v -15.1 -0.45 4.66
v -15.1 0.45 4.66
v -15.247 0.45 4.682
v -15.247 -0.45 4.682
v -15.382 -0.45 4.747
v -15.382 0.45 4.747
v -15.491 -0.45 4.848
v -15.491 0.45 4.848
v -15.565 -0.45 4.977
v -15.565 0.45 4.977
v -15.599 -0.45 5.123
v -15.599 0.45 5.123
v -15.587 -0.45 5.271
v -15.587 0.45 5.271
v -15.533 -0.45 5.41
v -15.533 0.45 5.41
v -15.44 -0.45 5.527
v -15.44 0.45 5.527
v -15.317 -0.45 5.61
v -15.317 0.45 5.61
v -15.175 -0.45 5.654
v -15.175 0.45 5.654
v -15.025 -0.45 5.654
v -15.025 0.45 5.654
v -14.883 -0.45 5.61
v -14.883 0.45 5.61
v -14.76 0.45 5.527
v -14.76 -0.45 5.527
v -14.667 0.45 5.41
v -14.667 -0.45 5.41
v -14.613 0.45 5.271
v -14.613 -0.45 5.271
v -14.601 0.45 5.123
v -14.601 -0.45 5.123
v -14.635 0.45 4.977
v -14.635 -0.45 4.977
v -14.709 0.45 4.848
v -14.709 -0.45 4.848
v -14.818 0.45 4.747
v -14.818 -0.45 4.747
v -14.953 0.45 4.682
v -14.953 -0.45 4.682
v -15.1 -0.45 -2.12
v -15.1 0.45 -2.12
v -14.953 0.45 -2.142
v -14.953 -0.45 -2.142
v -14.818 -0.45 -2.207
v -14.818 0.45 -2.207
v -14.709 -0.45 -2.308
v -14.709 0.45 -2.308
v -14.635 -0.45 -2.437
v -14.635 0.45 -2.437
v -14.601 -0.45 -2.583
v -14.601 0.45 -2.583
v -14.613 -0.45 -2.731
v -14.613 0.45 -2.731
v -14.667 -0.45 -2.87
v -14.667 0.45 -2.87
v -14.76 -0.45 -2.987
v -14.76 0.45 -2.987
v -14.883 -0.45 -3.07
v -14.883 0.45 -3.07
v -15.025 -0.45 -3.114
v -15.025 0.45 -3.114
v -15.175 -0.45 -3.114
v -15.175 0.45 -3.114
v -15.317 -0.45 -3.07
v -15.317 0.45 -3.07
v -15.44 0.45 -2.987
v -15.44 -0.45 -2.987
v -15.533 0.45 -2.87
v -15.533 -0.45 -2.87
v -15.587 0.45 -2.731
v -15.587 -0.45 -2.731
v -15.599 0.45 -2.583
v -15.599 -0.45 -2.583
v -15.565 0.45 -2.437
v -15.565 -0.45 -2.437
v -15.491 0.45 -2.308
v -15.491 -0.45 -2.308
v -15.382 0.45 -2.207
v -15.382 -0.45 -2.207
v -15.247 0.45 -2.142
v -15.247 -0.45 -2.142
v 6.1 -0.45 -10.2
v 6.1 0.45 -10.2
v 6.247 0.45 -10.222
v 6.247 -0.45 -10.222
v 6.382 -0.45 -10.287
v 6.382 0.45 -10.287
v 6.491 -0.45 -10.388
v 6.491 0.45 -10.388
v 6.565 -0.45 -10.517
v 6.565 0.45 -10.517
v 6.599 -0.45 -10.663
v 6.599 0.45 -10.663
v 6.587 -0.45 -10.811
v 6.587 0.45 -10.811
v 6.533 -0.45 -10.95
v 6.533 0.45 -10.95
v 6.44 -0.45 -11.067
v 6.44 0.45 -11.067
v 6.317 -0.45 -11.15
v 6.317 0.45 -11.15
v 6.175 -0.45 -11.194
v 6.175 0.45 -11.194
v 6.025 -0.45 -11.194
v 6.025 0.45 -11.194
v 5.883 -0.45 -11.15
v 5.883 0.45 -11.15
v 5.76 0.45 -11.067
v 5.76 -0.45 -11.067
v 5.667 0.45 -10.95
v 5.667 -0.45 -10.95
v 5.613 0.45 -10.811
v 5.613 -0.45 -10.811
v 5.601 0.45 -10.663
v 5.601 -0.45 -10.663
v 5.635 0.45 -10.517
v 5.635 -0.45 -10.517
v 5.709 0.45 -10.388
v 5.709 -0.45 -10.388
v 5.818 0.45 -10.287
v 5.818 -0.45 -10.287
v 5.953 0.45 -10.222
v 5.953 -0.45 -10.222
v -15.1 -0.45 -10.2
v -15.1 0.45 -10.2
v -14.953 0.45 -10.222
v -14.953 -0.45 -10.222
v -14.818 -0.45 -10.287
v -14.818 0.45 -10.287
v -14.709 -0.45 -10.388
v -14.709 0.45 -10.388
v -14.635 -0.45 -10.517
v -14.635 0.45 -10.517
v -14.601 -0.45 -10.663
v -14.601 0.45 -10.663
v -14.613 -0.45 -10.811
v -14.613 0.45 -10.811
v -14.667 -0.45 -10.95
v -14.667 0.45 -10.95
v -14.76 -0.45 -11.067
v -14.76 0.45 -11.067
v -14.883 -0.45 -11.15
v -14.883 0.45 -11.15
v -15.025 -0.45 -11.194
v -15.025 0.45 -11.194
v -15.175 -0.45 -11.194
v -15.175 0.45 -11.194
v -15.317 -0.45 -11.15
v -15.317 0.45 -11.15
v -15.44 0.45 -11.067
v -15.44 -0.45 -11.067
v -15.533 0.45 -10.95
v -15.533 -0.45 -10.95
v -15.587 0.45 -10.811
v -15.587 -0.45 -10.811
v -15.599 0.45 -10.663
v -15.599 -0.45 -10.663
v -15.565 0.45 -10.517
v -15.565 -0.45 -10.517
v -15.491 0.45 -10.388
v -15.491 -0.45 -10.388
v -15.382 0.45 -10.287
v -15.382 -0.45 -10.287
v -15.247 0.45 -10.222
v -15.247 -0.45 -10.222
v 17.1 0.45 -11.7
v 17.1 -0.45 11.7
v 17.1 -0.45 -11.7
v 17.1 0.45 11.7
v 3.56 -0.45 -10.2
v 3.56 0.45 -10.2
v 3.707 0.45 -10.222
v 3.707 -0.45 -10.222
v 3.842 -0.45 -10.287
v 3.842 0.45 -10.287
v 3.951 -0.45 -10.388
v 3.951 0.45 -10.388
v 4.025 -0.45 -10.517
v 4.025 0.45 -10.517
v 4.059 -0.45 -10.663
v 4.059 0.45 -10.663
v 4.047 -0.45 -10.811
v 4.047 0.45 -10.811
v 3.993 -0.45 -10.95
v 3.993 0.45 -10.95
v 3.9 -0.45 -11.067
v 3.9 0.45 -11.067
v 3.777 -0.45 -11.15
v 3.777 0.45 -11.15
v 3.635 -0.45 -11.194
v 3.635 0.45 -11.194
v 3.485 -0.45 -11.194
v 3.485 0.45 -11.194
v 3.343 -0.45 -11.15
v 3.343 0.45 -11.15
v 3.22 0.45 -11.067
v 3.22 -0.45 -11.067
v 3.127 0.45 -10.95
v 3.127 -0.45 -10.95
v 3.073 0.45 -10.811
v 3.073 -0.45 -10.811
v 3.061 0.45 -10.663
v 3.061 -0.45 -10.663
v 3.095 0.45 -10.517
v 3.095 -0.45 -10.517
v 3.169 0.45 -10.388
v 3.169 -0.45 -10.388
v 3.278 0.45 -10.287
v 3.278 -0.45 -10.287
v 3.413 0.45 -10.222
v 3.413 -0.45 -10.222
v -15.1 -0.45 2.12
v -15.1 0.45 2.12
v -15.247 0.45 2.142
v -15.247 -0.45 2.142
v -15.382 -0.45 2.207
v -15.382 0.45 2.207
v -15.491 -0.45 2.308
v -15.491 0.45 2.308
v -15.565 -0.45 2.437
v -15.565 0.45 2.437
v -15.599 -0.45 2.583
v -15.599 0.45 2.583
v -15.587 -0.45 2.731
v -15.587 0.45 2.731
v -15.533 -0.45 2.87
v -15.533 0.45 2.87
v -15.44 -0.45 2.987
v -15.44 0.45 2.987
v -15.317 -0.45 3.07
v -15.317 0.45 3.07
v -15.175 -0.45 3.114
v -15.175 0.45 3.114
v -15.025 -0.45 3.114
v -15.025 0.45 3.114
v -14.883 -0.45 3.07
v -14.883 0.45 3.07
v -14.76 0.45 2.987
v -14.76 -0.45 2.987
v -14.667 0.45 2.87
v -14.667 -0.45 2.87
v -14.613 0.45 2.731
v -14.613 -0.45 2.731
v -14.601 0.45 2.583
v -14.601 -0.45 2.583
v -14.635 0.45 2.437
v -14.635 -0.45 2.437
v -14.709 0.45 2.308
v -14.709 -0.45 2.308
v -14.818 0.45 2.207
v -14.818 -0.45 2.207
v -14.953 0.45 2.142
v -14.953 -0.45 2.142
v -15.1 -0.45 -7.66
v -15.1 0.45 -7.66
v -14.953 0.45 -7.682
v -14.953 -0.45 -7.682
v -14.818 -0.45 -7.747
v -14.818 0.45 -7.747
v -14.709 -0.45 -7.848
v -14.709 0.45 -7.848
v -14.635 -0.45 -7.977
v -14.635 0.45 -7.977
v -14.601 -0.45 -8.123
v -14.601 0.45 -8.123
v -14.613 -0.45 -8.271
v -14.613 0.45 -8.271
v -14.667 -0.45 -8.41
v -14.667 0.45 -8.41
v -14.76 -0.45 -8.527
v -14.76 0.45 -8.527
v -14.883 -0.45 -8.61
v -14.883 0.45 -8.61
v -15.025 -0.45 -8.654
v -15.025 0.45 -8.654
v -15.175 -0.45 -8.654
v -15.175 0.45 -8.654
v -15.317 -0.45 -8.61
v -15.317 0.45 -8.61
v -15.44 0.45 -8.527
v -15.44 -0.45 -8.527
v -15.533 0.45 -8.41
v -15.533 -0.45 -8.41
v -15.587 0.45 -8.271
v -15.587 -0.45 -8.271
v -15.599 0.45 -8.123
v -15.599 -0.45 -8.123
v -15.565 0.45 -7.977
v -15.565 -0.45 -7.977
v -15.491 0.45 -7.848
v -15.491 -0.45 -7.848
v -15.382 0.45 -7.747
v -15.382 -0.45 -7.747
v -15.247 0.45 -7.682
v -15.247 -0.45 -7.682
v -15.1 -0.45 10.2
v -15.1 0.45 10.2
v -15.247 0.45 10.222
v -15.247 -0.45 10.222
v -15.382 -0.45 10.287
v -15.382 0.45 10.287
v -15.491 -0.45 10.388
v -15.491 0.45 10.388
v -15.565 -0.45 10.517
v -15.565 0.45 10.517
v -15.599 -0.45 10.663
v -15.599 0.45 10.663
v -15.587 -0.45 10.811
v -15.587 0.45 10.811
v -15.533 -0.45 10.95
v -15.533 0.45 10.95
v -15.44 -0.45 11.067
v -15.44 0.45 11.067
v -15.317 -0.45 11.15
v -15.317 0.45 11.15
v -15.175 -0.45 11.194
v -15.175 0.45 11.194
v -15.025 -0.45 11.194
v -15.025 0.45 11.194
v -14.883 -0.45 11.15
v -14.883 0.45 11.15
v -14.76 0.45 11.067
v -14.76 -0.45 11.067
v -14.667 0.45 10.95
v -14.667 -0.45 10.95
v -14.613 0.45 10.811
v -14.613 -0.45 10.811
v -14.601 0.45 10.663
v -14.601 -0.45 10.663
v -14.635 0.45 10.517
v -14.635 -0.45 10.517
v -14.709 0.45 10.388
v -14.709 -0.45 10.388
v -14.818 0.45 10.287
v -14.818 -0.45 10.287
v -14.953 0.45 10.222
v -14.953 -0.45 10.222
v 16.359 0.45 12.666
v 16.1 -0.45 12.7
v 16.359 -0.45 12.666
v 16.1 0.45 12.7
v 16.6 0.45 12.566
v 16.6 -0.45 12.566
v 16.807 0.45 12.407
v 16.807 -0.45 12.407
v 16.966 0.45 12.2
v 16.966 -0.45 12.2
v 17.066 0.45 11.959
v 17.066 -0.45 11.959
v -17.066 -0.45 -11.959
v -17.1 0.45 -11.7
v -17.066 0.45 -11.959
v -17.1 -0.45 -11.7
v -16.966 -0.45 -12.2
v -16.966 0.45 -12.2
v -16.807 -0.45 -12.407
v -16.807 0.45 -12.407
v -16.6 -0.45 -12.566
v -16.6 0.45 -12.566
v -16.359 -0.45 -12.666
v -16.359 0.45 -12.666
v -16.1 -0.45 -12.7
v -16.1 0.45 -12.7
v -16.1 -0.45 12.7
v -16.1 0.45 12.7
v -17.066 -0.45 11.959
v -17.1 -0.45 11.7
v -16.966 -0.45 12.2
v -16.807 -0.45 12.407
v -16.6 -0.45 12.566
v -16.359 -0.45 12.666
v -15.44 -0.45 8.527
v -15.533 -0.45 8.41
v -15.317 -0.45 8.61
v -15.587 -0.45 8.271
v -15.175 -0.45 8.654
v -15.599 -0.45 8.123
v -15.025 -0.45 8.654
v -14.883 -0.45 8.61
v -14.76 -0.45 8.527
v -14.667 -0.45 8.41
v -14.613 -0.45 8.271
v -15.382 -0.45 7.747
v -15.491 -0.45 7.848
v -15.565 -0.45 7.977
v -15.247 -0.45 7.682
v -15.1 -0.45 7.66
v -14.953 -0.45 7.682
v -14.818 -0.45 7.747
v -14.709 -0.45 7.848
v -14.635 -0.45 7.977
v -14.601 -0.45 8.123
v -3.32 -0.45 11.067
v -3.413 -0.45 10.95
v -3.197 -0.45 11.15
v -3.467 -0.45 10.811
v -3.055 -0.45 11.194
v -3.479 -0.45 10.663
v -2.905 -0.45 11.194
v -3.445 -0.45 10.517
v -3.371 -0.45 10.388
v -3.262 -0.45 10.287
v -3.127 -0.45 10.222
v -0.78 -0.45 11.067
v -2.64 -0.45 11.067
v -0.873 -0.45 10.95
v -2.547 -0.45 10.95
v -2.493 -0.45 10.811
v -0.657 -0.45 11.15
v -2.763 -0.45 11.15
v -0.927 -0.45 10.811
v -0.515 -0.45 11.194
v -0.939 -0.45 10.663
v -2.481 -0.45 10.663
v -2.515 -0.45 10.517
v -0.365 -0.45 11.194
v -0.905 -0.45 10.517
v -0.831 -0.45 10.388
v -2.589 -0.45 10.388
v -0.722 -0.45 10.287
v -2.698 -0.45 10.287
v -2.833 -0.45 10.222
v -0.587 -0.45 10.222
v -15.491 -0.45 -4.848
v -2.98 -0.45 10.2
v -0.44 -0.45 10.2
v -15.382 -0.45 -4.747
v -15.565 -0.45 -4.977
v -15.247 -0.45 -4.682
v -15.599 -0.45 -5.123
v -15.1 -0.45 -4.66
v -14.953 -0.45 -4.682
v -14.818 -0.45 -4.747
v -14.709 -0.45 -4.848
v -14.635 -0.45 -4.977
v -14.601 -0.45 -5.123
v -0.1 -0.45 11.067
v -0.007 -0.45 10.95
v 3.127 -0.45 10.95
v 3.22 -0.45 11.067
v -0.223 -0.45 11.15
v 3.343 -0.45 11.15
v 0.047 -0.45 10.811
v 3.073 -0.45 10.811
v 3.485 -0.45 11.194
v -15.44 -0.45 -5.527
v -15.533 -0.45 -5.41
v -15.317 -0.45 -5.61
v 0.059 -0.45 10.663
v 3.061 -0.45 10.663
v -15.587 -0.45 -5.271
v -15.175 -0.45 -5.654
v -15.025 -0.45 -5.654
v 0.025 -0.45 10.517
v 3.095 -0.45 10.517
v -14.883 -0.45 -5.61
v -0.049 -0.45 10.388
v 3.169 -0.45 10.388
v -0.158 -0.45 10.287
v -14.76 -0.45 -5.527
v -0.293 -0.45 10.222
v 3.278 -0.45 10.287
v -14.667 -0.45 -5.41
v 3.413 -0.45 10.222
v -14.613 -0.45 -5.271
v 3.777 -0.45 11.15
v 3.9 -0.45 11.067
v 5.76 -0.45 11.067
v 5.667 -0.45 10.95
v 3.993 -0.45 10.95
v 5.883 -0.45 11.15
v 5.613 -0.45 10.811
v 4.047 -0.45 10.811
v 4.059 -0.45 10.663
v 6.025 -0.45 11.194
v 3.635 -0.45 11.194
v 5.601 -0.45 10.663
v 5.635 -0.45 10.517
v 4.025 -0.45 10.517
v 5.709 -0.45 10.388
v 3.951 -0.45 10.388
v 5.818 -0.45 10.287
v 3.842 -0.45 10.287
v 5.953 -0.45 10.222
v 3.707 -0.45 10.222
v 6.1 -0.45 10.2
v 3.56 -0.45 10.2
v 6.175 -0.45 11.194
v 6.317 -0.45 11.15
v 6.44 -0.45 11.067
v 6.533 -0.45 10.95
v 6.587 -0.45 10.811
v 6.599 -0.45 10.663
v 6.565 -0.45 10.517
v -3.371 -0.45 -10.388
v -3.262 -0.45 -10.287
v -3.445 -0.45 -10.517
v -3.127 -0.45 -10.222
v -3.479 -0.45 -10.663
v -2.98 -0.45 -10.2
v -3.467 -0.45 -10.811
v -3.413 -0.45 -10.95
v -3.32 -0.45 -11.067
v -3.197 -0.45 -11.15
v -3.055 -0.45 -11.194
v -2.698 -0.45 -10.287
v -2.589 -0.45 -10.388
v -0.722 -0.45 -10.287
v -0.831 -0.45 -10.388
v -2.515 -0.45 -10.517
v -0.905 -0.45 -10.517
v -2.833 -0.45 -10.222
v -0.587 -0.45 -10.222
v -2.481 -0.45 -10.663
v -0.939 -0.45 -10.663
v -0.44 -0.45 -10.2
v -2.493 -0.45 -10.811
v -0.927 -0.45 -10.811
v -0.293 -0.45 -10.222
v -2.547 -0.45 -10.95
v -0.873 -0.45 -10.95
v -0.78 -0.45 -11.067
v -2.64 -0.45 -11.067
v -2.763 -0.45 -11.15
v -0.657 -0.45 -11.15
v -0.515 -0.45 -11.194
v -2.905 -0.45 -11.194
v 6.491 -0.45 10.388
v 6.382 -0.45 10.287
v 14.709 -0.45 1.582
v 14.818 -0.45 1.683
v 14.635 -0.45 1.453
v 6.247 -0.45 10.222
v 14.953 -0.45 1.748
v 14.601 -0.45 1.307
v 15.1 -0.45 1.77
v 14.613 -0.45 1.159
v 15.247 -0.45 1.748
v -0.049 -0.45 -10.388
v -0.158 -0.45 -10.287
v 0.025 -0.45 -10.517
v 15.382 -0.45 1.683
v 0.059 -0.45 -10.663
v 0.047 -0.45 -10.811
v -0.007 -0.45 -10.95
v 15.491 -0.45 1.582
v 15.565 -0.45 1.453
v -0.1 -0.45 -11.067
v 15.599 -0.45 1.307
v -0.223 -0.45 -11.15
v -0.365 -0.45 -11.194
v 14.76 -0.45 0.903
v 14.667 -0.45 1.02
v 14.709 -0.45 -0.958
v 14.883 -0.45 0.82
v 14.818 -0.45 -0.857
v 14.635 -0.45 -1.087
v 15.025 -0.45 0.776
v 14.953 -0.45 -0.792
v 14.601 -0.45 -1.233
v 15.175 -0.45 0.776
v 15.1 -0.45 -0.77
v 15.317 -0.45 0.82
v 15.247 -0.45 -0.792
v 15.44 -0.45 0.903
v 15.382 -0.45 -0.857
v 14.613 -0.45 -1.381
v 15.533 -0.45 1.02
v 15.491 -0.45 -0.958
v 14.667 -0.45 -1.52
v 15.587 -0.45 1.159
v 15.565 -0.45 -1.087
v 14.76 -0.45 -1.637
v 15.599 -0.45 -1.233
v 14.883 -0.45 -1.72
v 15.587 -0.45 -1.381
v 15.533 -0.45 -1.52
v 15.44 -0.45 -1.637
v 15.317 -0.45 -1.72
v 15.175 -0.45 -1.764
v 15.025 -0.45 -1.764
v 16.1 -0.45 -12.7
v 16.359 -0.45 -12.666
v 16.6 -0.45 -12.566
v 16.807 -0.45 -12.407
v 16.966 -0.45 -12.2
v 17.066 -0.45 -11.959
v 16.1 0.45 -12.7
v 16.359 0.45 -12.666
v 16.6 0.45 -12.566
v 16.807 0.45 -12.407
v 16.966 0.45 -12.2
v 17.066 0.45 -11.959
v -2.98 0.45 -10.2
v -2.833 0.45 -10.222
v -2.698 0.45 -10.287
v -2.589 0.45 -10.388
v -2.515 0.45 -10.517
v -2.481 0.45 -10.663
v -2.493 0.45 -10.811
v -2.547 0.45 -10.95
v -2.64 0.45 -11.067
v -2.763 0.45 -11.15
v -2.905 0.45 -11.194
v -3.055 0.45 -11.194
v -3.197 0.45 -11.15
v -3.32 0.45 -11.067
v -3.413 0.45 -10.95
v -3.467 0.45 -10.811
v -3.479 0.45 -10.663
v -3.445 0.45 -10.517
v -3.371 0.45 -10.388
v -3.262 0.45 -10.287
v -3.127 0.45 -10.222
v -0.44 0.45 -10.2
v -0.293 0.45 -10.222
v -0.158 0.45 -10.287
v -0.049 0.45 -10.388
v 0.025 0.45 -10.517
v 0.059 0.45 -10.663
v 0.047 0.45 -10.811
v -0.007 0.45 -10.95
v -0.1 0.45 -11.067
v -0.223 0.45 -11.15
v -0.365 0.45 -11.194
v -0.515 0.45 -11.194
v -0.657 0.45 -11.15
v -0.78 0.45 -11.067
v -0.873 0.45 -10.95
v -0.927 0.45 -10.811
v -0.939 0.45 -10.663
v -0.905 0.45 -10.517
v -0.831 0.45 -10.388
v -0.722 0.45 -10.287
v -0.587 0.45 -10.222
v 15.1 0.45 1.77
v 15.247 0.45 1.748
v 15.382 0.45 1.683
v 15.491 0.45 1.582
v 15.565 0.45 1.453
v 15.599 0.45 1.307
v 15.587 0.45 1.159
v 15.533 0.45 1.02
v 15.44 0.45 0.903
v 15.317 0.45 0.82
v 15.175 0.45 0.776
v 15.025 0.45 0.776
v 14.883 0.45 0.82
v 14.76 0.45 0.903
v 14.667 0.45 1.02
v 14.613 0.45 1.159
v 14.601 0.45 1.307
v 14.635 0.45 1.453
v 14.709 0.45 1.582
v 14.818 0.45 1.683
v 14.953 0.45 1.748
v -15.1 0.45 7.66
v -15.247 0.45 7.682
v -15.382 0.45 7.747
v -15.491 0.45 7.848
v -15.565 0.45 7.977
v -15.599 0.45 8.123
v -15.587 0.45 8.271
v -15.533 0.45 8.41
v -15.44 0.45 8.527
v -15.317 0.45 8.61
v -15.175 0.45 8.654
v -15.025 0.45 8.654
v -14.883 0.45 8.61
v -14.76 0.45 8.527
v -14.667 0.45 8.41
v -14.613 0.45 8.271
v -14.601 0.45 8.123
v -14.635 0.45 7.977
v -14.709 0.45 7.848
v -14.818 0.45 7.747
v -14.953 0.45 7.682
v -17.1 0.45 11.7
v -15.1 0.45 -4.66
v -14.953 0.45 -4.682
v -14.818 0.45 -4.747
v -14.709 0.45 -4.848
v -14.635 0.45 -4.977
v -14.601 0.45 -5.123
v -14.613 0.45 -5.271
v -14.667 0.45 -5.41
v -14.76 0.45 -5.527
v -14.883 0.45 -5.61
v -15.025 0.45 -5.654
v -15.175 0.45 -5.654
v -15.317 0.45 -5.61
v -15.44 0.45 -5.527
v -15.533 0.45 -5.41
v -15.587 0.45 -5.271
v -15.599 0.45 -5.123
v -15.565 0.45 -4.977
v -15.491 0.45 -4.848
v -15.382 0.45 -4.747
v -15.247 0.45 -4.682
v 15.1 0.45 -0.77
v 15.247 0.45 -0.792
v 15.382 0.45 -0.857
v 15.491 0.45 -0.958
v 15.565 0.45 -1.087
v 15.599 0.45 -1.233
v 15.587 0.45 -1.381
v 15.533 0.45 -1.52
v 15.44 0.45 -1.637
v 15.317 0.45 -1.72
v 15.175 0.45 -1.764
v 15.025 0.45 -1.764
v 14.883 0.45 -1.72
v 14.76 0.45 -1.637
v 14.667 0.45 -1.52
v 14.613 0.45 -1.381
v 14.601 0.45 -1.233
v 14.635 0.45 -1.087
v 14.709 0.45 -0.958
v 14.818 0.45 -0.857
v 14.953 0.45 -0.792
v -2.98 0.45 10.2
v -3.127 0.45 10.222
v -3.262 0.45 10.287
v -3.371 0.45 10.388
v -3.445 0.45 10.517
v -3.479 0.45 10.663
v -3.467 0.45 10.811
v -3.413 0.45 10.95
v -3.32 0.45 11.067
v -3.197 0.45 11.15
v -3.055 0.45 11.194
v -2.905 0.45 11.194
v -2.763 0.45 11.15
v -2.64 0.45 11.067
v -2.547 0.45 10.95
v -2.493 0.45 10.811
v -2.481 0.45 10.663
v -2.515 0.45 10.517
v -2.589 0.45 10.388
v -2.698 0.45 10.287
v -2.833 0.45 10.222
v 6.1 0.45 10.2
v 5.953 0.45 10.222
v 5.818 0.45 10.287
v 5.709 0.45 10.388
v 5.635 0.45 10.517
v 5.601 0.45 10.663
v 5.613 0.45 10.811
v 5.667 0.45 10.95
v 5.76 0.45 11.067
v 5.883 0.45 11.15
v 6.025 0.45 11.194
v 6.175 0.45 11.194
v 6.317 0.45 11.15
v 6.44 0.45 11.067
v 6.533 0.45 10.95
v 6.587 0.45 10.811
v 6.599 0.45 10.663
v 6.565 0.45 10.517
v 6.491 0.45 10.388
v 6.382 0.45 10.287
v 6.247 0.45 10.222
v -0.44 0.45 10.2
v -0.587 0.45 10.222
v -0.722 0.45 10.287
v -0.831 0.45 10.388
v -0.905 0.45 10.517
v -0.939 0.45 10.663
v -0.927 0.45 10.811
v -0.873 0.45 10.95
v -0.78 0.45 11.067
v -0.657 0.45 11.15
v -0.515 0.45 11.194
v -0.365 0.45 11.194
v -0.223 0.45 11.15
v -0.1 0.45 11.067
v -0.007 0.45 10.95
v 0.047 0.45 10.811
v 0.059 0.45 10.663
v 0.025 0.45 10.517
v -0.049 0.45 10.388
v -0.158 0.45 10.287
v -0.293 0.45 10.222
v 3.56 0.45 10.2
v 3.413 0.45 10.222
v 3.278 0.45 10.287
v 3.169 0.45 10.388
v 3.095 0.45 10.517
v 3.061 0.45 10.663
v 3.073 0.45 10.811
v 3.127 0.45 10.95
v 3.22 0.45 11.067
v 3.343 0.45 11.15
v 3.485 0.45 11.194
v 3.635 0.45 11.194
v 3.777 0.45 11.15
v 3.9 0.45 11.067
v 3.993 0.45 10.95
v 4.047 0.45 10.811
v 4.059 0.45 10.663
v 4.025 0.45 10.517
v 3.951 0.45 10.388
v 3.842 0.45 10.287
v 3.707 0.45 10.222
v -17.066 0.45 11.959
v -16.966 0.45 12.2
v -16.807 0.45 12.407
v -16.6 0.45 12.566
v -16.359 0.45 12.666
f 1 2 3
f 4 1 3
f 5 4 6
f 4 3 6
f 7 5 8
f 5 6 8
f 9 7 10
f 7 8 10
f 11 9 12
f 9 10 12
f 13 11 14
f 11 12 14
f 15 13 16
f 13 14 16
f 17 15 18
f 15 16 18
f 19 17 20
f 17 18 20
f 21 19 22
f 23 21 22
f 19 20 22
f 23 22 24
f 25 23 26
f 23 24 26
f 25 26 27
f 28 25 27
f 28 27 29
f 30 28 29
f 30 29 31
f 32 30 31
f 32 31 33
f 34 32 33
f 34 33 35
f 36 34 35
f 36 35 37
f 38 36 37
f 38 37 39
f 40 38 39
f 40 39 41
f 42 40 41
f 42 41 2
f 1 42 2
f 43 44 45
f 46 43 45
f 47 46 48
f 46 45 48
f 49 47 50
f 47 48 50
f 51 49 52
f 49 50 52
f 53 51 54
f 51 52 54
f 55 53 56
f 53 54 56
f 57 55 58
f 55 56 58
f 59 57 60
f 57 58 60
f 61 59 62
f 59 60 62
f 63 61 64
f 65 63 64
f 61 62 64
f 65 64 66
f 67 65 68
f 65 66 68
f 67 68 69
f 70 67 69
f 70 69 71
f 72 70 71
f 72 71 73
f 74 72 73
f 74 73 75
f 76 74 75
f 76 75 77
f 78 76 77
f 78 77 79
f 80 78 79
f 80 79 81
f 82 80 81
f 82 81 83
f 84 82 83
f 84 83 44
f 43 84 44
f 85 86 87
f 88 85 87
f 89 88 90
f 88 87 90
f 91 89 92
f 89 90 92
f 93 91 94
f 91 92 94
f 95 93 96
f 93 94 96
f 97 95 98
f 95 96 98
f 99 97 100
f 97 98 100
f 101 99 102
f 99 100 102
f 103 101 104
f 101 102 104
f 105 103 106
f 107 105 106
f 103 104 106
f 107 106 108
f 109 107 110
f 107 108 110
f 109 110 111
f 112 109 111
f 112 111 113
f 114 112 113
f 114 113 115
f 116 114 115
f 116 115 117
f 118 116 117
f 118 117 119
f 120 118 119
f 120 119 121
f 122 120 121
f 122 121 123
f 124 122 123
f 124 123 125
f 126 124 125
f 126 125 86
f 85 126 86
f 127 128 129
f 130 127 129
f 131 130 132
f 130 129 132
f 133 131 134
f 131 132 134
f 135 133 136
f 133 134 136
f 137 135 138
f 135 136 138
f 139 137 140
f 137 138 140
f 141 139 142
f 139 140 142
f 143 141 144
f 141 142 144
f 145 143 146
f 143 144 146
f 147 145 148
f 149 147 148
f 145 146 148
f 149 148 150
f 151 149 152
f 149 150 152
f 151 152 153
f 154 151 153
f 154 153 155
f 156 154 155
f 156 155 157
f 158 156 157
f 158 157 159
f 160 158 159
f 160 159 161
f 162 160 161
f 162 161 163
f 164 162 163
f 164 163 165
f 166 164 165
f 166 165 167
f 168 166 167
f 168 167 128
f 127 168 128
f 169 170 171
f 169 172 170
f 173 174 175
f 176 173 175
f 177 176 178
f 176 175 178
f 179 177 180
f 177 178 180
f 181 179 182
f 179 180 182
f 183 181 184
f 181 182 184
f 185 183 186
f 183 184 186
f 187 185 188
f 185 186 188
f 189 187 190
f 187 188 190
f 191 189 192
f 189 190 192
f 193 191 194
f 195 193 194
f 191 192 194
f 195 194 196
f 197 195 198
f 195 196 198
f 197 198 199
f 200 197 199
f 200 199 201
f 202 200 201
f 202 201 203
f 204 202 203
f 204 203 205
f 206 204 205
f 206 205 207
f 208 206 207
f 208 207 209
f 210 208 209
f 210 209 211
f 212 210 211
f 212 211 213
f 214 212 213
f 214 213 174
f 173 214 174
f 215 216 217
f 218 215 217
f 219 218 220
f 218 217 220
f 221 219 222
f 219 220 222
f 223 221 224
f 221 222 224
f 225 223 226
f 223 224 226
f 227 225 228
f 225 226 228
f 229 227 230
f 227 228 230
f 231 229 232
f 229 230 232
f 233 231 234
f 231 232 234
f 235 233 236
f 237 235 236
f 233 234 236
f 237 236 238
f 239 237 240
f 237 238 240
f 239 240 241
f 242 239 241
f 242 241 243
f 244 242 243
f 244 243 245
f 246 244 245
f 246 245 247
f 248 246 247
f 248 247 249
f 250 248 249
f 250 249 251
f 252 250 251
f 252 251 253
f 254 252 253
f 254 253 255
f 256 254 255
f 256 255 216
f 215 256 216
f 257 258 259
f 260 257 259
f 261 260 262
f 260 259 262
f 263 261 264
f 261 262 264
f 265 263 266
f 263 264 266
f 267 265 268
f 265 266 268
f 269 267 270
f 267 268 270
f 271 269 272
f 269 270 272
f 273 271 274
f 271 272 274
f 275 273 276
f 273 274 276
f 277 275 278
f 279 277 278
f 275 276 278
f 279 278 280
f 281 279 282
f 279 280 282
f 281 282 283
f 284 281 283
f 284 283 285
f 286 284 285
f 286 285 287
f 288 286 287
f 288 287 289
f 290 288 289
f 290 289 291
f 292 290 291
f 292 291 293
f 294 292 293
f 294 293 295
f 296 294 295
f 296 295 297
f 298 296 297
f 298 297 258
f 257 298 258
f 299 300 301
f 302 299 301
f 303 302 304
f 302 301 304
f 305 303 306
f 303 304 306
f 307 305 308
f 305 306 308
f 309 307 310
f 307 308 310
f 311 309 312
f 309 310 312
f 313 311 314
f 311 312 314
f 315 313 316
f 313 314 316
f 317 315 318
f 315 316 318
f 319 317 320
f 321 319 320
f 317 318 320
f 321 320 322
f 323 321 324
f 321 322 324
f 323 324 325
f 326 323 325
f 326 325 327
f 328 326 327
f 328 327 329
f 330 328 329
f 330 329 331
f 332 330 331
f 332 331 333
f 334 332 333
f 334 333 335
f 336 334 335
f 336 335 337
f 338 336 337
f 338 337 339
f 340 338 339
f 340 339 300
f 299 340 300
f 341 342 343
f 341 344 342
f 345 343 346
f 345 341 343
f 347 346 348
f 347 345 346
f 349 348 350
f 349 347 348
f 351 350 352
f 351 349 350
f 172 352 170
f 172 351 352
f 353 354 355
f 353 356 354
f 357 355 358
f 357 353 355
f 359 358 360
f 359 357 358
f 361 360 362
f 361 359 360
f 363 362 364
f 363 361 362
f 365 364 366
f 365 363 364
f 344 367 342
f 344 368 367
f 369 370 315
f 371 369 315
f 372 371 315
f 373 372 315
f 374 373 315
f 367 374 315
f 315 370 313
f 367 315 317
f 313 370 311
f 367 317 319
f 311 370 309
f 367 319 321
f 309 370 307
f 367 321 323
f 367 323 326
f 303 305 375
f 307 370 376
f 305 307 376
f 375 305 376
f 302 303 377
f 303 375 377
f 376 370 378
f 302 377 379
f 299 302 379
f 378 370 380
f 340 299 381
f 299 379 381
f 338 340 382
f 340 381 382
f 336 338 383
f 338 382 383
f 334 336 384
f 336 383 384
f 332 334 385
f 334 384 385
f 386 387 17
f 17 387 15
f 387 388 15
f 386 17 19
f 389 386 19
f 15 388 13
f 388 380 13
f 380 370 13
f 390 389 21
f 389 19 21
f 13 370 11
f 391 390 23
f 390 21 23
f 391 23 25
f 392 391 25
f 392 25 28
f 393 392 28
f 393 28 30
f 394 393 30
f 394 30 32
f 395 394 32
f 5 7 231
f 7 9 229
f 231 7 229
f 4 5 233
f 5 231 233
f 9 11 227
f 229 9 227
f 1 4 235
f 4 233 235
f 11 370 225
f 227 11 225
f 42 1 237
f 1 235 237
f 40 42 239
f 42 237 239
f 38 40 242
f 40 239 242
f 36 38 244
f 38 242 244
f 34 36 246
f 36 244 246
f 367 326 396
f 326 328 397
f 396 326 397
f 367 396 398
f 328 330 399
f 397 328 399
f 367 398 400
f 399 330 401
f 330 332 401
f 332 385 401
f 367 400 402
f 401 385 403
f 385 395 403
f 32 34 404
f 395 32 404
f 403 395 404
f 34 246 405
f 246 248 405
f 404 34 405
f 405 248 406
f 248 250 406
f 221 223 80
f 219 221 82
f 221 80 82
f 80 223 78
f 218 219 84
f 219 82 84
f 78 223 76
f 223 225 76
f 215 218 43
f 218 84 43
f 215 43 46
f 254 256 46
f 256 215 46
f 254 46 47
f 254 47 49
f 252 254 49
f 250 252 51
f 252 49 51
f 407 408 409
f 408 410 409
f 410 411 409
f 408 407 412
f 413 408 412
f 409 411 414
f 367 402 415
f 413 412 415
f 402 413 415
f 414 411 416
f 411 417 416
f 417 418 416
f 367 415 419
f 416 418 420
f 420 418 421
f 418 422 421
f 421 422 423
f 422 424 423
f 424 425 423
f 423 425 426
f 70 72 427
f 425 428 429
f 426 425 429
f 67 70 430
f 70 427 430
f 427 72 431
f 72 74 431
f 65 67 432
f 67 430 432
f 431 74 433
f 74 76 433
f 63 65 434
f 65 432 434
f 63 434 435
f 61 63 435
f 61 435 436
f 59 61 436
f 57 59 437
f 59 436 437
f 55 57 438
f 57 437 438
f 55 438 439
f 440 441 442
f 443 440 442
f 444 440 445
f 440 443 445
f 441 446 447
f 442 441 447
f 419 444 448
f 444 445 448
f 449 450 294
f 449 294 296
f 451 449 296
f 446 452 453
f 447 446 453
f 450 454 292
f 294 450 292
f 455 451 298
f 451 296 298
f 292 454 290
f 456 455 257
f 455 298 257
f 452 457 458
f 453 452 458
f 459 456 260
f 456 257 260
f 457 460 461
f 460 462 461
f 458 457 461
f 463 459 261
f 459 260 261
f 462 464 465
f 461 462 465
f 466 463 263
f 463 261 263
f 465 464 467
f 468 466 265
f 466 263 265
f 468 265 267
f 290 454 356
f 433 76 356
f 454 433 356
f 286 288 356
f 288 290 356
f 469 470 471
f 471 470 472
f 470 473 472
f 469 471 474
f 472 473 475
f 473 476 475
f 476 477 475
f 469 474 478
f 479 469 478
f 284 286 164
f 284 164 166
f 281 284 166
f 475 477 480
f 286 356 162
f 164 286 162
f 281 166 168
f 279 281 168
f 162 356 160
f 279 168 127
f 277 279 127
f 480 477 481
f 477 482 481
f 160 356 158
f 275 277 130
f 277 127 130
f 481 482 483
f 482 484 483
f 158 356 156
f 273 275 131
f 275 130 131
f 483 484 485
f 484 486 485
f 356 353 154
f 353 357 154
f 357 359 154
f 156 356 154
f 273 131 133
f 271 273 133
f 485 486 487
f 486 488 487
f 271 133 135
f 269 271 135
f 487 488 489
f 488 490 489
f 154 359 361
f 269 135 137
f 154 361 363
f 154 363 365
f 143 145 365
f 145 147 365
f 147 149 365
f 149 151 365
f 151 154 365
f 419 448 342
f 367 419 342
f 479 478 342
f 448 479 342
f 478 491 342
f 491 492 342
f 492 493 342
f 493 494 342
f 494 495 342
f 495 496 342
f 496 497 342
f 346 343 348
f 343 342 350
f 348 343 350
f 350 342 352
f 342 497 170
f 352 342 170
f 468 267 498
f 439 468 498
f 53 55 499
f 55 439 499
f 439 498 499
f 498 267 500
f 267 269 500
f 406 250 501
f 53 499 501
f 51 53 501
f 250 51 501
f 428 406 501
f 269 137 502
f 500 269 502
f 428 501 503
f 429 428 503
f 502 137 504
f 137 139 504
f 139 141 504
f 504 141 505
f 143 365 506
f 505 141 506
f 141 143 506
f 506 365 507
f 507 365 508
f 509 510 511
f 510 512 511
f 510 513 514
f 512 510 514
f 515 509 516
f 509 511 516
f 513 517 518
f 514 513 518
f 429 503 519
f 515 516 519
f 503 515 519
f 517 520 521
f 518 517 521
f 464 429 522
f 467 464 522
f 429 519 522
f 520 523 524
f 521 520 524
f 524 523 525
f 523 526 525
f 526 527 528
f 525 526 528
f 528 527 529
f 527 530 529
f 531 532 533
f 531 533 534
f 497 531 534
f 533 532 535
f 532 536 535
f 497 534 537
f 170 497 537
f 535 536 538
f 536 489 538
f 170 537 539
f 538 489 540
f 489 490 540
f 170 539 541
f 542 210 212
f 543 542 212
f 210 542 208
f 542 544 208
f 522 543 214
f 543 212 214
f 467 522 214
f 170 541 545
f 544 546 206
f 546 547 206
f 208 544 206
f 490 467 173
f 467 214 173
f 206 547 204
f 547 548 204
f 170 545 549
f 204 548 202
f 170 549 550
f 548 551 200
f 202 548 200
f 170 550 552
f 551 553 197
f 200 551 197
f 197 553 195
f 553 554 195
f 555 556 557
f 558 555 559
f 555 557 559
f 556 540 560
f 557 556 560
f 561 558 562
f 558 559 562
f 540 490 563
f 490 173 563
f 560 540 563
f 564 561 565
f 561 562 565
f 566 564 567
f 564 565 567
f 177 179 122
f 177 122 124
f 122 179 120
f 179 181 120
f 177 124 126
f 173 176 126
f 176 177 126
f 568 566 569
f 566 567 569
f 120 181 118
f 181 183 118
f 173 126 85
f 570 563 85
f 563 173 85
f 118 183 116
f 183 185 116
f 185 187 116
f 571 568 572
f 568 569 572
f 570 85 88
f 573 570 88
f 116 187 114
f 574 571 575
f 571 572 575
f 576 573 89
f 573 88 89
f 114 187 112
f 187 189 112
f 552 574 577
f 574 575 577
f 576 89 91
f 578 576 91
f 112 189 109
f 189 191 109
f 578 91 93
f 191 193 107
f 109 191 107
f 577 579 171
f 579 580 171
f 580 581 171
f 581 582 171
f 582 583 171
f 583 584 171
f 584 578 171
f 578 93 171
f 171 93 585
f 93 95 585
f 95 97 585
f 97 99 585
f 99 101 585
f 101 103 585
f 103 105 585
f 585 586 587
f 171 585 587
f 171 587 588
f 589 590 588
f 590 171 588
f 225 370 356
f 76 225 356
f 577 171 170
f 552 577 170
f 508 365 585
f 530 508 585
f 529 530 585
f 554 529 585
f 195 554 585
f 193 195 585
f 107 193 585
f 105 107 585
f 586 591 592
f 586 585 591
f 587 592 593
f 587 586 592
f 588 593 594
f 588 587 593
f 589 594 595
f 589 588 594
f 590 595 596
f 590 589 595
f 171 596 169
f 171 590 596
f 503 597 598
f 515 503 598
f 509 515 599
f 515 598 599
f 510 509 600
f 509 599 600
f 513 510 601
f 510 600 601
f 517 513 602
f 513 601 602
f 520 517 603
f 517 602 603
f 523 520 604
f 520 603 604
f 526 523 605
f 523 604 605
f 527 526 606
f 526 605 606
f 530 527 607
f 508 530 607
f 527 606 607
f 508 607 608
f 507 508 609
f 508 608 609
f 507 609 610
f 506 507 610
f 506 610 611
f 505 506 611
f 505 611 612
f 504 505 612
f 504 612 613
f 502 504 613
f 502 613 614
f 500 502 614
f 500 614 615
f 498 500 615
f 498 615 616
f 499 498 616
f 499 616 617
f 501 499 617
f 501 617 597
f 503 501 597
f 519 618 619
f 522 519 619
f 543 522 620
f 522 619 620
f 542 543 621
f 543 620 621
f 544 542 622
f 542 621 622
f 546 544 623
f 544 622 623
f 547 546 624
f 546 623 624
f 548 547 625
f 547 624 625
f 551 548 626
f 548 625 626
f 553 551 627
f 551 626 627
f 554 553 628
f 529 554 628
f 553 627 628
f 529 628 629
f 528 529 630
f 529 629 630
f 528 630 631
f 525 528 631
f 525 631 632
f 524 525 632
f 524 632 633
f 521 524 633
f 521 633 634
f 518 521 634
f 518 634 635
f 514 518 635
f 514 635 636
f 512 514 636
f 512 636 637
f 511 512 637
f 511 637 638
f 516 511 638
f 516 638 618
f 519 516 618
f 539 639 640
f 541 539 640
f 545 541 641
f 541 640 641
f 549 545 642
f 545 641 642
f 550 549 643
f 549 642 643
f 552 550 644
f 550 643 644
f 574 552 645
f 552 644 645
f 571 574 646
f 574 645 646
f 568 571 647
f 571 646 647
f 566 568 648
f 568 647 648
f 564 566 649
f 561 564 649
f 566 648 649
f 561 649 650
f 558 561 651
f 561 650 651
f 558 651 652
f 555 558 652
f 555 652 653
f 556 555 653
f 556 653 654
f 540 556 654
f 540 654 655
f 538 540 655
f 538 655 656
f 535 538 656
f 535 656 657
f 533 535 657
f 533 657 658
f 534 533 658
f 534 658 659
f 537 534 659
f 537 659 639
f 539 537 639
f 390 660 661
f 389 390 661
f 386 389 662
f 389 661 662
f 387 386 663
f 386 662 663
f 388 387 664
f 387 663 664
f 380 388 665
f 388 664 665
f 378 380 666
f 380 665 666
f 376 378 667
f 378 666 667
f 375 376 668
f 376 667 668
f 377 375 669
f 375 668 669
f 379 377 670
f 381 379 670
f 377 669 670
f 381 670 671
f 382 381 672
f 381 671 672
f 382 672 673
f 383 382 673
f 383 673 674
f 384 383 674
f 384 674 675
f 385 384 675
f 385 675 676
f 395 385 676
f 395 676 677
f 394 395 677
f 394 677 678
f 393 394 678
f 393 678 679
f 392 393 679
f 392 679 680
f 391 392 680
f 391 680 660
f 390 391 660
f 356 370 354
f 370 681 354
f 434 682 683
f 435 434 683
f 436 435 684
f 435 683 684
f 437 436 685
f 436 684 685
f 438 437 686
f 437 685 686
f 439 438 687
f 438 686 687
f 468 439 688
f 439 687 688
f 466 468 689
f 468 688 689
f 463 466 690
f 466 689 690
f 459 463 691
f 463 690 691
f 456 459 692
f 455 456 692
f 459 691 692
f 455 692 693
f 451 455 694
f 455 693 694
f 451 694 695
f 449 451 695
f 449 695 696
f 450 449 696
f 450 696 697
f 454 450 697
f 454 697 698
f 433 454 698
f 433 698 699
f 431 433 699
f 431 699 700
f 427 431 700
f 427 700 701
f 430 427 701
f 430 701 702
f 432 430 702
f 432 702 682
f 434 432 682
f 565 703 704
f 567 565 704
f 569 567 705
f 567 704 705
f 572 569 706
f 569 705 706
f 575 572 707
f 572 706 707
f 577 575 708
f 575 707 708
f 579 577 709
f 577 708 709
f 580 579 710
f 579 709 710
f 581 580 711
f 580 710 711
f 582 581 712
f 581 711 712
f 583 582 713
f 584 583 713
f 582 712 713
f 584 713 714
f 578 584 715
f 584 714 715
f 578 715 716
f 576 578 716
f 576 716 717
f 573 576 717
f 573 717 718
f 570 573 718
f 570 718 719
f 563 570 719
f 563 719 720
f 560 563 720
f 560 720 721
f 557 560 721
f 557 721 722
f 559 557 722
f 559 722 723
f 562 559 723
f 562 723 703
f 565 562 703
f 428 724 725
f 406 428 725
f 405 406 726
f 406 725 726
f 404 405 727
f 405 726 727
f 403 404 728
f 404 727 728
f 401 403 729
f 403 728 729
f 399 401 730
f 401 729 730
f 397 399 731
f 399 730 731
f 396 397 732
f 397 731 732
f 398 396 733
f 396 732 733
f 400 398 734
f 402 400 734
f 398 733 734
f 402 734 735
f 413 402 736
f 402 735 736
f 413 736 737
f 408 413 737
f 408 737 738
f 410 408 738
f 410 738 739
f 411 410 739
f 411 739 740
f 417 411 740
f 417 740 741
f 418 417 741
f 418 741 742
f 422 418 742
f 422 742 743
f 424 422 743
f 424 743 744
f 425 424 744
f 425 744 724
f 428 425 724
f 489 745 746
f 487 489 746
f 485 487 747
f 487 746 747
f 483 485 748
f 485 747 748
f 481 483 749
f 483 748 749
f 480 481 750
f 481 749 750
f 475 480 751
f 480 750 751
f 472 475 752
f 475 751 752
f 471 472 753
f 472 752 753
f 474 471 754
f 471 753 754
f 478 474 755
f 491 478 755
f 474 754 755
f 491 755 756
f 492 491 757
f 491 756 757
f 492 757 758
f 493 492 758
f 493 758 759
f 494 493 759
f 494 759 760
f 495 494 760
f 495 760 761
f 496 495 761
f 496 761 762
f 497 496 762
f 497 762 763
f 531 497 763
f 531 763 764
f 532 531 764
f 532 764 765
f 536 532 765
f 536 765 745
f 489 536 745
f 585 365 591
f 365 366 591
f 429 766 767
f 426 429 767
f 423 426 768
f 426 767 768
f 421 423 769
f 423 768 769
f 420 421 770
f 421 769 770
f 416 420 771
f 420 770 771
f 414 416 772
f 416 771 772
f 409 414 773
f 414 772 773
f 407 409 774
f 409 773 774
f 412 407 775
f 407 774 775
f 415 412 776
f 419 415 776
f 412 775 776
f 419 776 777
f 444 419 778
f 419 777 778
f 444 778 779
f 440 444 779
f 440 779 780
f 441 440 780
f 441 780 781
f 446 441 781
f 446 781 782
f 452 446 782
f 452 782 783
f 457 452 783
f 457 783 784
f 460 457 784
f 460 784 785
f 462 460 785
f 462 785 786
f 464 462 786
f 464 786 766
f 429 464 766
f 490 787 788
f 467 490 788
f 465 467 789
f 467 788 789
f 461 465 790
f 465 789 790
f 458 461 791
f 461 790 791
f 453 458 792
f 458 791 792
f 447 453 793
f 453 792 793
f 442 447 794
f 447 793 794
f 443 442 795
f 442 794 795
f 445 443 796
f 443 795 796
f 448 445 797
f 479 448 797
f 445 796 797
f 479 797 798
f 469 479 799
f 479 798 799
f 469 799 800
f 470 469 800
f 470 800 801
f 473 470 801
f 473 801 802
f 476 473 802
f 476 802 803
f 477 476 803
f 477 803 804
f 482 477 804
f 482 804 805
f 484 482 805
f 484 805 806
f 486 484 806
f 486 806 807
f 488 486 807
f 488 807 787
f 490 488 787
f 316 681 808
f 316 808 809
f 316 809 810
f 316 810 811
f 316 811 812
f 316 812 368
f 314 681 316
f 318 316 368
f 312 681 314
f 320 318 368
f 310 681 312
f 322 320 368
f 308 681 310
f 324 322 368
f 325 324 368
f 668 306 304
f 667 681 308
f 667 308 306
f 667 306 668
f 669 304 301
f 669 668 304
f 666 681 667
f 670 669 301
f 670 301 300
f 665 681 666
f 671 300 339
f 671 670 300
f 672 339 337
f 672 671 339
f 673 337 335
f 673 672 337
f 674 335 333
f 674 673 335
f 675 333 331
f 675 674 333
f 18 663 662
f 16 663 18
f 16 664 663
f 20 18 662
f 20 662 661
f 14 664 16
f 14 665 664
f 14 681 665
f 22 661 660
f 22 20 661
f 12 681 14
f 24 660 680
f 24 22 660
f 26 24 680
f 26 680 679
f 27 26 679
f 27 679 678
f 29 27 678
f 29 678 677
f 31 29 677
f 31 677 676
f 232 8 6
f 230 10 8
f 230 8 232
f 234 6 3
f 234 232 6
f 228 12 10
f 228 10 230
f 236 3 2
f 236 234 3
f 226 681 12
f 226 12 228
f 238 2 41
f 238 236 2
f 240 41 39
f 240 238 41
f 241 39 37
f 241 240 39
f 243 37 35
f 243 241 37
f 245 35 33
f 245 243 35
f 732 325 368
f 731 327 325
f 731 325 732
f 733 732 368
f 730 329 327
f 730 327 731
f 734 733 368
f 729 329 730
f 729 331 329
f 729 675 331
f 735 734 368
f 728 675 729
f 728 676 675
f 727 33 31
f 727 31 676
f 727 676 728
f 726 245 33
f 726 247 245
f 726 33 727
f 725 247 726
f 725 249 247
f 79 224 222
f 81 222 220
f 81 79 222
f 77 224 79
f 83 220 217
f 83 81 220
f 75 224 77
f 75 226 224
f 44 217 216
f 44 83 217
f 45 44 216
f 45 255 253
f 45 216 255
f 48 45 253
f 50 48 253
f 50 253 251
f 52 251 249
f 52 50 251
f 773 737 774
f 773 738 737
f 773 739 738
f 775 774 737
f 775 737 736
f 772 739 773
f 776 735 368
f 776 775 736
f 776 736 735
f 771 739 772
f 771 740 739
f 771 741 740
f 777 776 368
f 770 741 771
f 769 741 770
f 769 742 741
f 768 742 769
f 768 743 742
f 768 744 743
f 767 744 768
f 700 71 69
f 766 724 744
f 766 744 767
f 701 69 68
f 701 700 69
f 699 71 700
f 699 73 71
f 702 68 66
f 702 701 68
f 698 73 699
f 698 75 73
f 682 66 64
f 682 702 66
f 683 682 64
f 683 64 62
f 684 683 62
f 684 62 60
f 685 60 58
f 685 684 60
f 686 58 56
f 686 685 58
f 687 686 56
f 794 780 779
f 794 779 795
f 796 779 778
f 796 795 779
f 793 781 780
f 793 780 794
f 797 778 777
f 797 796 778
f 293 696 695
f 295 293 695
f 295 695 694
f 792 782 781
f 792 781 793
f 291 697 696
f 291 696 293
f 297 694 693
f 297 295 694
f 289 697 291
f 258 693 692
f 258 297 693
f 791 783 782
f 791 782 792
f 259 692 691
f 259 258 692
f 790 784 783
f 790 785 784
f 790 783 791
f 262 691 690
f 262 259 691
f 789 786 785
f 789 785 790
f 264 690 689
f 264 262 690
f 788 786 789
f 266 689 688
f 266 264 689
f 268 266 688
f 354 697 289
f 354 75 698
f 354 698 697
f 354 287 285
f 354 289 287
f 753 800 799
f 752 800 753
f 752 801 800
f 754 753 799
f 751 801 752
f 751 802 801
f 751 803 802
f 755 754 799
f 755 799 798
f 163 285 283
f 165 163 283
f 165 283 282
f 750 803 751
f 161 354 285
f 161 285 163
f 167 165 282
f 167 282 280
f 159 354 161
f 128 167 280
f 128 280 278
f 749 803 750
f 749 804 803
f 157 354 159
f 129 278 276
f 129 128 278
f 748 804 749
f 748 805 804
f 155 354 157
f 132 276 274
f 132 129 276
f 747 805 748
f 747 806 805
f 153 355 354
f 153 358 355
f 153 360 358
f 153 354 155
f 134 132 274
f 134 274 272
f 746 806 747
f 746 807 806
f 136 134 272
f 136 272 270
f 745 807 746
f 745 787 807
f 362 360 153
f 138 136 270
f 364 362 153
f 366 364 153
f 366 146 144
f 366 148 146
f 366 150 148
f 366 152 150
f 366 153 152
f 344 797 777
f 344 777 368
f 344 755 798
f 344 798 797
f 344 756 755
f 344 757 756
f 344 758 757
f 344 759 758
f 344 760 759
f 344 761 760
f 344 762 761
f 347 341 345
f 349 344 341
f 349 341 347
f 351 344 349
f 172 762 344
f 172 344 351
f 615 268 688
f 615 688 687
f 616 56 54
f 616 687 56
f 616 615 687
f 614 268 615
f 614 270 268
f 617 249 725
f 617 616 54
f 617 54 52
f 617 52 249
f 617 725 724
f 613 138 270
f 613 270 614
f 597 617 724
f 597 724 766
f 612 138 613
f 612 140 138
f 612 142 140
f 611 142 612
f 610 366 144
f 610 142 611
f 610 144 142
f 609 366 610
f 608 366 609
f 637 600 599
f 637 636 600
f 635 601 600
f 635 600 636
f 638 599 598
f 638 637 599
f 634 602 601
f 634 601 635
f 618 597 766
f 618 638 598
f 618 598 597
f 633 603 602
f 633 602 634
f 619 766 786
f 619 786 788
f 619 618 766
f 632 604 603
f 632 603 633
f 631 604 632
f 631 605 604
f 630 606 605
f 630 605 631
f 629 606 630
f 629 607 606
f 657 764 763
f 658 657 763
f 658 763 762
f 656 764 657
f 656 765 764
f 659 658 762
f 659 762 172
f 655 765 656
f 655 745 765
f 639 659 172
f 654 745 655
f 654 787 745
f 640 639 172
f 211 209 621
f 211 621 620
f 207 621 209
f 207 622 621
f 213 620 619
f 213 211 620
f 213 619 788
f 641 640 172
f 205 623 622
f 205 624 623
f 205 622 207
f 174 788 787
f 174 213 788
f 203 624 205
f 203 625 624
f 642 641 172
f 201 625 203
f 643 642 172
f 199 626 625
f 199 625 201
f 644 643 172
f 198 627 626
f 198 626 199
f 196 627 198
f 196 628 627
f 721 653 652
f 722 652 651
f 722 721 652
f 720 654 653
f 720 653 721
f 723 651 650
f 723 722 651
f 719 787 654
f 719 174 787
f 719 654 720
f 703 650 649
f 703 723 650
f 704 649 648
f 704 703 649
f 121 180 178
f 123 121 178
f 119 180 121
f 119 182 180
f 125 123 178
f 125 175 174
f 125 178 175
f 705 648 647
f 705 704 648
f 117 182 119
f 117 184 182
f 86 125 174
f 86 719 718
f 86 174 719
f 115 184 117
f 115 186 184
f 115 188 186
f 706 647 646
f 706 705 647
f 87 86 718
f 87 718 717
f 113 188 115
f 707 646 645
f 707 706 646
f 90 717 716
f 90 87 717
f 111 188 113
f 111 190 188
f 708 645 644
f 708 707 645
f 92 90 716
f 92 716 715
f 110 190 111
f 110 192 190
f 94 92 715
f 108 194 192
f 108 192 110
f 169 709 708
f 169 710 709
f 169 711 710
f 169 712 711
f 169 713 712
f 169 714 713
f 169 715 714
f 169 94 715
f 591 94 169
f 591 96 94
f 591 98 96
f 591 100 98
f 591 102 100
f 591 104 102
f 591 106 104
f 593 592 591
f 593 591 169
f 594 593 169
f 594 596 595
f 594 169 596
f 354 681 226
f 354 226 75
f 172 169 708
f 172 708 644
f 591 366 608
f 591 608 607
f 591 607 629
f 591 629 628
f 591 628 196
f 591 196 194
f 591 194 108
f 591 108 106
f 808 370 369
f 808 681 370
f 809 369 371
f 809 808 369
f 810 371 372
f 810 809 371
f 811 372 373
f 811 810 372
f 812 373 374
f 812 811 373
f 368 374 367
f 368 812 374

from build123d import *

# Parameters (mm, degrees)
ESBO_O1_W                = 34.2
ESBO_O1_H                = 25.4
RESSALTO_EXTRUS_O1_DEPTH = 0.45
ESBO_O2_R                = 0.5
CORTE_EXTRUS_O1_DEPTH    = 22.319240137
FILETE1_R                = 1


with BuildPart() as part:
    # Esboço1 → Ressalto-extrusão1 (new, symmetric)
    with BuildSketch(Plane(origin=(0, 0, 0), x_dir=(1, 0, 0), z_dir=(0, 1, 0))):
        Rectangle(ESBO_O1_W, ESBO_O1_H)
    extrude(amount=RESSALTO_EXTRUS_O1_DEPTH, both=True)

    # Esboço2 → Corte-extrusão1 (cut, through all)
    with BuildSketch(Plane(origin=(0, 0.45, 0), x_dir=(1, 0, 0), z_dir=(0, 1, 0))):
        with Locations(Location((15.1, 1.27, 0), (0, 0, 270))):
            Circle(ESBO_O2_R)
        with Locations(Location((15.1, -1.27, 0), (0, 0, 270))):
            Circle(ESBO_O2_R)
        with Locations(Location((-2.98, 10.7, 0), (0, 0, 270))):
            Circle(ESBO_O2_R)
        with Locations(Location((-0.44, 10.7, 0), (0, 0, 270))):
            Circle(ESBO_O2_R)
        with Locations(Location((3.56, 10.7, 0), (0, 0, 270))):
            Circle(ESBO_O2_R)
        with Locations(Location((6.1, 10.7, 0), (0, 0, 270))):
            Circle(ESBO_O2_R)
        with Locations(Location((-15.1, 2.62, 0), (0, 0, 270))):
            Circle(ESBO_O2_R)
        with Locations(Location((-15.1, 5.16, 0), (0, 0, 270))):
            Circle(ESBO_O2_R)
        with Locations(Location((-15.1, 8.16, 0), (0, 0, 270))):
            Circle(ESBO_O2_R)
        with Locations(Location((-15.1, 10.7, 0), (0, 0, 270))):
            Circle(ESBO_O2_R)
        with Locations(Location((6.1, -10.7, 0), (0, 0, 90))):
            Circle(ESBO_O2_R)
        with Locations(Location((3.56, -10.7, 0), (0, 0, 90))):
            Circle(ESBO_O2_R)
        with Locations(Location((-0.44, -10.7, 0), (0, 0, 90))):
            Circle(ESBO_O2_R)
        with Locations(Location((-2.98, -10.7, 0), (0, 0, 90))):
            Circle(ESBO_O2_R)
        with Locations(Location((-15.1, -10.7, 0), (0, 0, 90))):
            Circle(ESBO_O2_R)
        with Locations(Location((-15.1, -8.16, 0), (0, 0, 90))):
            Circle(ESBO_O2_R)
        with Locations(Location((-15.1, -5.16, 0), (0, 0, 90))):
            Circle(ESBO_O2_R)
        with Locations(Location((-15.1, -2.62, 0), (0, 0, 90))):
            Circle(ESBO_O2_R)
    extrude(amount=-CORTE_EXTRUS_O1_DEPTH, mode=Mode.SUBTRACT)

    # Filete1
    filete1_edges = [part.edges().sort_by_distance(p)[0] for p in [
        (-17.1, 0, -12.7),
        (17.1, 0, -12.7),
        (17.1, 0, 12.7),
        (-17.1, 0, 12.7),
    ]]
    fillet(filete1_edges, radius=FILETE1_R)


solid = part.part
